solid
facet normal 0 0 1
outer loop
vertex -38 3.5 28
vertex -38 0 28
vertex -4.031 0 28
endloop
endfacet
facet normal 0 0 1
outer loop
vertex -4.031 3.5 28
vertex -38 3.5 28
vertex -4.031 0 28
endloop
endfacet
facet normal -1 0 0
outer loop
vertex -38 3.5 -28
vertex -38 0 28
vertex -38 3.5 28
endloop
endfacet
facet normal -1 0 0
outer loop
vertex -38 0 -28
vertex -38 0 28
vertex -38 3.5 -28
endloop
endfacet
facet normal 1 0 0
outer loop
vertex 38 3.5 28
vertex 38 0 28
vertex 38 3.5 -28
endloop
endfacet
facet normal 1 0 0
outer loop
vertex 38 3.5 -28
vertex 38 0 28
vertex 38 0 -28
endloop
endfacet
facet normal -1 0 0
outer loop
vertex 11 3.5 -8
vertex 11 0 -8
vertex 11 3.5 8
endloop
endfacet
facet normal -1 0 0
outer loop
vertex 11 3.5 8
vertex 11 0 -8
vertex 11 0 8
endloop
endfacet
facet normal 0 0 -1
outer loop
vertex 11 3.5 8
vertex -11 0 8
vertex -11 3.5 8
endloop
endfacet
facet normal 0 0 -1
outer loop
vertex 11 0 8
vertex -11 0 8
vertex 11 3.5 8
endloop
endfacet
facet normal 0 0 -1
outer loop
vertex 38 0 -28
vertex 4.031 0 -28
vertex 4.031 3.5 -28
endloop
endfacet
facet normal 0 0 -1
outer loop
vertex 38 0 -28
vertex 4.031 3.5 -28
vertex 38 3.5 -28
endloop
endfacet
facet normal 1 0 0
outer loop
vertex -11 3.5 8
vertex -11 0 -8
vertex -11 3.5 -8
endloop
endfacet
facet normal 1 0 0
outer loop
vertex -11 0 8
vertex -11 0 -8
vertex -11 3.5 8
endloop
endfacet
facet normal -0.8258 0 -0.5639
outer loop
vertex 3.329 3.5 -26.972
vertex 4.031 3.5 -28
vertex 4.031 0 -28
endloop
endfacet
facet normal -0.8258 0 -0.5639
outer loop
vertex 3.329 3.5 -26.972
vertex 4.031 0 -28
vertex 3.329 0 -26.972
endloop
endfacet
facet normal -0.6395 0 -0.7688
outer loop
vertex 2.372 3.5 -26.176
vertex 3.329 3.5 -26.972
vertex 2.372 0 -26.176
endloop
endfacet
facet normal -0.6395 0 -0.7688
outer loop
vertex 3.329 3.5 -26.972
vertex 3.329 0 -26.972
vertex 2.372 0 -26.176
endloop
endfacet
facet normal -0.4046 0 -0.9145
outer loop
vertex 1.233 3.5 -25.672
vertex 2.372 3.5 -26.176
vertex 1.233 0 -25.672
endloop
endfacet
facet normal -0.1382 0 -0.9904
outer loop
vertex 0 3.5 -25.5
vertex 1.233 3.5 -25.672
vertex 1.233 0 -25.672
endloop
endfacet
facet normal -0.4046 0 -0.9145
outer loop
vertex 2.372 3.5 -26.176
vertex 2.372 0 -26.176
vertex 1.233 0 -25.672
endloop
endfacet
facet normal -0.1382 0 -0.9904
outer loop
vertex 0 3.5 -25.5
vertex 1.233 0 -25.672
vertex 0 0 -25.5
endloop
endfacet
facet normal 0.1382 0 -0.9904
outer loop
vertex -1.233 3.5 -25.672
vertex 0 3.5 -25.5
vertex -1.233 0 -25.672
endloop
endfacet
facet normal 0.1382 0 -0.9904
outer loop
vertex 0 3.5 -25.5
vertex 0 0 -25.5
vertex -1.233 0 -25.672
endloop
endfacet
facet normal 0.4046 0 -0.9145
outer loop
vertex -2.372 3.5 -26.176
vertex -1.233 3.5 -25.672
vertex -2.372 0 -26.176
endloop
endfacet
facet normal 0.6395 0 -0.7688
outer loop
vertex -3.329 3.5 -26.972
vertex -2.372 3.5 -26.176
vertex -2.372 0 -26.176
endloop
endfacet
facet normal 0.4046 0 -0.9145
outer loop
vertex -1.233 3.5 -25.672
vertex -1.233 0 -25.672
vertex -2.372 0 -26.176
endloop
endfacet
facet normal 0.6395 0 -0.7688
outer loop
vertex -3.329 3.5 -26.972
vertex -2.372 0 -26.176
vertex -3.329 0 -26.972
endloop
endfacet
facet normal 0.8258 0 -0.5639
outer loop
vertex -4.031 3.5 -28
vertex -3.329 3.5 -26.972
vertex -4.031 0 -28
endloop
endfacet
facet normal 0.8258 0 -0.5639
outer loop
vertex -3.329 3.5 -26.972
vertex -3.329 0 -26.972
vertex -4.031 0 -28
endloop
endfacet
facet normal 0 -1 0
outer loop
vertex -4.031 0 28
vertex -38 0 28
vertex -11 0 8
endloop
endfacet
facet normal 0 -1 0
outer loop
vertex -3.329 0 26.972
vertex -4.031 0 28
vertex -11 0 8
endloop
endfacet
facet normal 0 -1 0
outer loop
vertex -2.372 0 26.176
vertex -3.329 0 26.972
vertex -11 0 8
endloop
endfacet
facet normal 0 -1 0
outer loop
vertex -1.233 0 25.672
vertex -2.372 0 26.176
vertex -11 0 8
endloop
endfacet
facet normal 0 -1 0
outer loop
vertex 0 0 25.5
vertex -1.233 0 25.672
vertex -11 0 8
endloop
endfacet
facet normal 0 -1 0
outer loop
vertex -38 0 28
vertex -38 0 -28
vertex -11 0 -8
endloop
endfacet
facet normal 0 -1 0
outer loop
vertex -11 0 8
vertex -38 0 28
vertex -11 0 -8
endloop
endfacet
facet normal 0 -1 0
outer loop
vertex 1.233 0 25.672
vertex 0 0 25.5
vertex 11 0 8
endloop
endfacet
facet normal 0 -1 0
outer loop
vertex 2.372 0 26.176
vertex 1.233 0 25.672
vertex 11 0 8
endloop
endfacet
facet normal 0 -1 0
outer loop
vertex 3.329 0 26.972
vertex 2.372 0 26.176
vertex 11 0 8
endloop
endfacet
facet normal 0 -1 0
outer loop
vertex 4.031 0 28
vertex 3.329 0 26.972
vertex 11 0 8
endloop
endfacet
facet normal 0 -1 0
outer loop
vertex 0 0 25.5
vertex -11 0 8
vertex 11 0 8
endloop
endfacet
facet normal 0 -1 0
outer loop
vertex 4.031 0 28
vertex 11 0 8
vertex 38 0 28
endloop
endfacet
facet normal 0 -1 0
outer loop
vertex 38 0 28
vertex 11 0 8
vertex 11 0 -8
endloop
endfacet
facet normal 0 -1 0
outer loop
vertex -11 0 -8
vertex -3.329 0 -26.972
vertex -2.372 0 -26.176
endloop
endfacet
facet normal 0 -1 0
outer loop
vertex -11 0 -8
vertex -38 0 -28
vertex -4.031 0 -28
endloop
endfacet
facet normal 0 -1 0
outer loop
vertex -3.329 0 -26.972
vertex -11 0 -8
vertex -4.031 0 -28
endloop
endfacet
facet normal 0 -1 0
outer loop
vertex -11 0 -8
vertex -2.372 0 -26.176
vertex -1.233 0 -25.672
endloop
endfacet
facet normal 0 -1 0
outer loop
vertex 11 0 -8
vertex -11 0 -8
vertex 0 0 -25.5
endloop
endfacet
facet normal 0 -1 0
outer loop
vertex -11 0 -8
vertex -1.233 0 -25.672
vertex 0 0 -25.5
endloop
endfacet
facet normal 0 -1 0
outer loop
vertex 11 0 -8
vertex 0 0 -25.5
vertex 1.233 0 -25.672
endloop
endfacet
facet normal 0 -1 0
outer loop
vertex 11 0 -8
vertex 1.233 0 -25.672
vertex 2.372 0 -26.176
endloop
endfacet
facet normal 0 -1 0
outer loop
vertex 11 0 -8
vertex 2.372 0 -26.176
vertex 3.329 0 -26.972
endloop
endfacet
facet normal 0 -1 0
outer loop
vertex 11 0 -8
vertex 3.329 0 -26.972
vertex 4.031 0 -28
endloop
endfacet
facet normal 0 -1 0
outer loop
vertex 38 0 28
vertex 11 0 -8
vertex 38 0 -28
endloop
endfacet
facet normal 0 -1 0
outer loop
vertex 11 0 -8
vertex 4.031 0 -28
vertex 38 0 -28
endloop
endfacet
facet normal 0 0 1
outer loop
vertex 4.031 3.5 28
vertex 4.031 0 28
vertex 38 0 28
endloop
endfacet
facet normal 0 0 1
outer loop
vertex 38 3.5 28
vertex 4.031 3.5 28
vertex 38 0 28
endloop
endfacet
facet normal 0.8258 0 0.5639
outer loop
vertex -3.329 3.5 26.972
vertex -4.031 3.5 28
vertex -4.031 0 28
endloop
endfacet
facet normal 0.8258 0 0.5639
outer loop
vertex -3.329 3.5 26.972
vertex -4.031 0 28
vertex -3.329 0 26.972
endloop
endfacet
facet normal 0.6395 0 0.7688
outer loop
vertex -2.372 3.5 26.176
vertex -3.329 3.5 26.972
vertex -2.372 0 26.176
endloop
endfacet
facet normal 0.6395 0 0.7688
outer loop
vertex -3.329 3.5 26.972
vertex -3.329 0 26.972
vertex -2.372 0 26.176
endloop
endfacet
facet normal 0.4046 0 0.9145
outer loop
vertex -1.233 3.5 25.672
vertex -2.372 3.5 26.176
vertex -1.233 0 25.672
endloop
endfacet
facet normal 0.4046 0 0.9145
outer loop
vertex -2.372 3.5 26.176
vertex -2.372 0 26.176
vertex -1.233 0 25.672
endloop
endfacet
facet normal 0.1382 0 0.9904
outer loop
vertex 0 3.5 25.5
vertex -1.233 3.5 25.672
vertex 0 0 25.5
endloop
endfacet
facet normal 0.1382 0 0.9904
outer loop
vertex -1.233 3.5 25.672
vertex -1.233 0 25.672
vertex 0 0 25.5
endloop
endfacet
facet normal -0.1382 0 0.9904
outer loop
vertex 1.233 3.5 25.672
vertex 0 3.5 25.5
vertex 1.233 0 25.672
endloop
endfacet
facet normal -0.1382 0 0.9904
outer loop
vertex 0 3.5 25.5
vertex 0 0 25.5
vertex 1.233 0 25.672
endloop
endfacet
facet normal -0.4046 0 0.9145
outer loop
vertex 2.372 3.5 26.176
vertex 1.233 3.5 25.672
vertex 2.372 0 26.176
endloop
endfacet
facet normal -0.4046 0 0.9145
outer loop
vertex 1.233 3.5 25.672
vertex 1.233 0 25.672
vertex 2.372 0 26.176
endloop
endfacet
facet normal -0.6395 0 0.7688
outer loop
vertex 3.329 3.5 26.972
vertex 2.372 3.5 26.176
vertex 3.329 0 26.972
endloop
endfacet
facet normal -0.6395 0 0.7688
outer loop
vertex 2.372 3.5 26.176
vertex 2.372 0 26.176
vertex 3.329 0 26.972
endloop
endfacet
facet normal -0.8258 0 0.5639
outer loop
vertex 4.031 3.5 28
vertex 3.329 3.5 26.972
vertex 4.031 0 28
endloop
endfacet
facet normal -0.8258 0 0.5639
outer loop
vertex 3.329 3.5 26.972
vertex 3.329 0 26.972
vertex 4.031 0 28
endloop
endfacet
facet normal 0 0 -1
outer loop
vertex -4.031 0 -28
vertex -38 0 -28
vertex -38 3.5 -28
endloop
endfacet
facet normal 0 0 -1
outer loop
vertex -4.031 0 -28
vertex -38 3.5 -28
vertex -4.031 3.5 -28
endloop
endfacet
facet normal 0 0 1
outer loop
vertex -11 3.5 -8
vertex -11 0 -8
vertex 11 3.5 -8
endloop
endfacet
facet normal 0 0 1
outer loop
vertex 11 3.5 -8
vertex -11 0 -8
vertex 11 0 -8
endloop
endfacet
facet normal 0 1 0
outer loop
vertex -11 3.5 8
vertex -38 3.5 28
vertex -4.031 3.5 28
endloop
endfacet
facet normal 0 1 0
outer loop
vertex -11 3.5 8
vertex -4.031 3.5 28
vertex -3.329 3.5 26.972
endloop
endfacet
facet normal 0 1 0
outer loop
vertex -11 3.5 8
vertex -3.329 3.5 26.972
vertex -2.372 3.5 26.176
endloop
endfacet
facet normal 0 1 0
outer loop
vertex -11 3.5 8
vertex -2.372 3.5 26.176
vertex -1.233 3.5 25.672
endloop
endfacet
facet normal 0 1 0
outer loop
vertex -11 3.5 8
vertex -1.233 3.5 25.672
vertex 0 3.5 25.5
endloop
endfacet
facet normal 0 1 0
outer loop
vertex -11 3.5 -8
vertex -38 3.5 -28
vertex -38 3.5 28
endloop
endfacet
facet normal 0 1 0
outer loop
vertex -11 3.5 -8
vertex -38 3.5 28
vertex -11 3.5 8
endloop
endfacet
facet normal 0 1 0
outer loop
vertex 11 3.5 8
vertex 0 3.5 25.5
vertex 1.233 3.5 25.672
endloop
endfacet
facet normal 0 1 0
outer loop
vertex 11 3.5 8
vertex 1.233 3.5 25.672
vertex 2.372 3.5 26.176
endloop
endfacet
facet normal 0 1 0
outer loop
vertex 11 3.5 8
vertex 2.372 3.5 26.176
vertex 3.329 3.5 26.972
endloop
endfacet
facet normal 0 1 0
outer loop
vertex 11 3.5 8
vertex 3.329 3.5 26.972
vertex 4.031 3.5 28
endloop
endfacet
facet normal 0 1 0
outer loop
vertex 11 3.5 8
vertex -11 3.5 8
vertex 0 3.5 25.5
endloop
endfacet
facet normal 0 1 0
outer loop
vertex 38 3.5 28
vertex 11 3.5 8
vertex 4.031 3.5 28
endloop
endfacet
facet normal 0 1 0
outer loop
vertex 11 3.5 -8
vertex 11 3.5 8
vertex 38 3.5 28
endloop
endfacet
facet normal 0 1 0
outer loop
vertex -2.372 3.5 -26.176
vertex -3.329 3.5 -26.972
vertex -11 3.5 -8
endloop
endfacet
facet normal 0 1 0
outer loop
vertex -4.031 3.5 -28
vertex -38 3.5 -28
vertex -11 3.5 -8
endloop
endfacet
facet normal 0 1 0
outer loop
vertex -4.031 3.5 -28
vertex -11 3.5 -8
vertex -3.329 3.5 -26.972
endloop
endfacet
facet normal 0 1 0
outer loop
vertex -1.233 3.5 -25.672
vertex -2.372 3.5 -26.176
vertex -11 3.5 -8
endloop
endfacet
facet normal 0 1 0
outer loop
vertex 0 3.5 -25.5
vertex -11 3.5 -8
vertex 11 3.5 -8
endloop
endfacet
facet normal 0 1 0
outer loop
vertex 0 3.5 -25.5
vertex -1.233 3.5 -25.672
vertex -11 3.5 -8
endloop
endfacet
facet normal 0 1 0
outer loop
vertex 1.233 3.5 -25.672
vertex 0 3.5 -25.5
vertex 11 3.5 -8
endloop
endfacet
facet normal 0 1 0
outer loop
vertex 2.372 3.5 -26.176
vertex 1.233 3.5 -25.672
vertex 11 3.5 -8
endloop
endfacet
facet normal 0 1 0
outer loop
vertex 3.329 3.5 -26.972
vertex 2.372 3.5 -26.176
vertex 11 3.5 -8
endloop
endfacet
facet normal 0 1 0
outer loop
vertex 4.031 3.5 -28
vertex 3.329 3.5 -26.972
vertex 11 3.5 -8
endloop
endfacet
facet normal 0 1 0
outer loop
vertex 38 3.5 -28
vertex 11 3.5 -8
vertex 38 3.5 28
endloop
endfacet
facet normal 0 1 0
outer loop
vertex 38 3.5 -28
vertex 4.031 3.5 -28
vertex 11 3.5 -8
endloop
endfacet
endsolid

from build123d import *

# Parameters (mm, degrees)
SKETCH1_W           = 76
SKETCH1_H           = 56
BOSS_EXTRUDE1_DEPTH = 3.5
SKETCH2_R           = 4.5
SKETCH2_W           = 22
SKETCH2_H           = 16
CUT_EXTRUDE1_DEPTH  = 3.5


with BuildPart() as part:
    # Sketch1 → Boss-Extrude1 (new body)
    with BuildSketch(Plane(origin=(0, 0, 0), x_dir=(1, 0, 0), z_dir=(0, 1, 0))):
        Rectangle(SKETCH1_W, SKETCH1_H)
    extrude(amount=BOSS_EXTRUDE1_DEPTH)

    # Sketch2 → Cut-Extrude1 (cut)
    with BuildSketch(Plane.XZ):
        with Locations((0, -30)):
            Circle(SKETCH2_R)
        with Locations((0, 30)):
            Circle(SKETCH2_R)
        Rectangle(SKETCH2_W, SKETCH2_H)
    extrude(amount=-CUT_EXTRUDE1_DEPTH, mode=Mode.SUBTRACT)


solid = part.part
